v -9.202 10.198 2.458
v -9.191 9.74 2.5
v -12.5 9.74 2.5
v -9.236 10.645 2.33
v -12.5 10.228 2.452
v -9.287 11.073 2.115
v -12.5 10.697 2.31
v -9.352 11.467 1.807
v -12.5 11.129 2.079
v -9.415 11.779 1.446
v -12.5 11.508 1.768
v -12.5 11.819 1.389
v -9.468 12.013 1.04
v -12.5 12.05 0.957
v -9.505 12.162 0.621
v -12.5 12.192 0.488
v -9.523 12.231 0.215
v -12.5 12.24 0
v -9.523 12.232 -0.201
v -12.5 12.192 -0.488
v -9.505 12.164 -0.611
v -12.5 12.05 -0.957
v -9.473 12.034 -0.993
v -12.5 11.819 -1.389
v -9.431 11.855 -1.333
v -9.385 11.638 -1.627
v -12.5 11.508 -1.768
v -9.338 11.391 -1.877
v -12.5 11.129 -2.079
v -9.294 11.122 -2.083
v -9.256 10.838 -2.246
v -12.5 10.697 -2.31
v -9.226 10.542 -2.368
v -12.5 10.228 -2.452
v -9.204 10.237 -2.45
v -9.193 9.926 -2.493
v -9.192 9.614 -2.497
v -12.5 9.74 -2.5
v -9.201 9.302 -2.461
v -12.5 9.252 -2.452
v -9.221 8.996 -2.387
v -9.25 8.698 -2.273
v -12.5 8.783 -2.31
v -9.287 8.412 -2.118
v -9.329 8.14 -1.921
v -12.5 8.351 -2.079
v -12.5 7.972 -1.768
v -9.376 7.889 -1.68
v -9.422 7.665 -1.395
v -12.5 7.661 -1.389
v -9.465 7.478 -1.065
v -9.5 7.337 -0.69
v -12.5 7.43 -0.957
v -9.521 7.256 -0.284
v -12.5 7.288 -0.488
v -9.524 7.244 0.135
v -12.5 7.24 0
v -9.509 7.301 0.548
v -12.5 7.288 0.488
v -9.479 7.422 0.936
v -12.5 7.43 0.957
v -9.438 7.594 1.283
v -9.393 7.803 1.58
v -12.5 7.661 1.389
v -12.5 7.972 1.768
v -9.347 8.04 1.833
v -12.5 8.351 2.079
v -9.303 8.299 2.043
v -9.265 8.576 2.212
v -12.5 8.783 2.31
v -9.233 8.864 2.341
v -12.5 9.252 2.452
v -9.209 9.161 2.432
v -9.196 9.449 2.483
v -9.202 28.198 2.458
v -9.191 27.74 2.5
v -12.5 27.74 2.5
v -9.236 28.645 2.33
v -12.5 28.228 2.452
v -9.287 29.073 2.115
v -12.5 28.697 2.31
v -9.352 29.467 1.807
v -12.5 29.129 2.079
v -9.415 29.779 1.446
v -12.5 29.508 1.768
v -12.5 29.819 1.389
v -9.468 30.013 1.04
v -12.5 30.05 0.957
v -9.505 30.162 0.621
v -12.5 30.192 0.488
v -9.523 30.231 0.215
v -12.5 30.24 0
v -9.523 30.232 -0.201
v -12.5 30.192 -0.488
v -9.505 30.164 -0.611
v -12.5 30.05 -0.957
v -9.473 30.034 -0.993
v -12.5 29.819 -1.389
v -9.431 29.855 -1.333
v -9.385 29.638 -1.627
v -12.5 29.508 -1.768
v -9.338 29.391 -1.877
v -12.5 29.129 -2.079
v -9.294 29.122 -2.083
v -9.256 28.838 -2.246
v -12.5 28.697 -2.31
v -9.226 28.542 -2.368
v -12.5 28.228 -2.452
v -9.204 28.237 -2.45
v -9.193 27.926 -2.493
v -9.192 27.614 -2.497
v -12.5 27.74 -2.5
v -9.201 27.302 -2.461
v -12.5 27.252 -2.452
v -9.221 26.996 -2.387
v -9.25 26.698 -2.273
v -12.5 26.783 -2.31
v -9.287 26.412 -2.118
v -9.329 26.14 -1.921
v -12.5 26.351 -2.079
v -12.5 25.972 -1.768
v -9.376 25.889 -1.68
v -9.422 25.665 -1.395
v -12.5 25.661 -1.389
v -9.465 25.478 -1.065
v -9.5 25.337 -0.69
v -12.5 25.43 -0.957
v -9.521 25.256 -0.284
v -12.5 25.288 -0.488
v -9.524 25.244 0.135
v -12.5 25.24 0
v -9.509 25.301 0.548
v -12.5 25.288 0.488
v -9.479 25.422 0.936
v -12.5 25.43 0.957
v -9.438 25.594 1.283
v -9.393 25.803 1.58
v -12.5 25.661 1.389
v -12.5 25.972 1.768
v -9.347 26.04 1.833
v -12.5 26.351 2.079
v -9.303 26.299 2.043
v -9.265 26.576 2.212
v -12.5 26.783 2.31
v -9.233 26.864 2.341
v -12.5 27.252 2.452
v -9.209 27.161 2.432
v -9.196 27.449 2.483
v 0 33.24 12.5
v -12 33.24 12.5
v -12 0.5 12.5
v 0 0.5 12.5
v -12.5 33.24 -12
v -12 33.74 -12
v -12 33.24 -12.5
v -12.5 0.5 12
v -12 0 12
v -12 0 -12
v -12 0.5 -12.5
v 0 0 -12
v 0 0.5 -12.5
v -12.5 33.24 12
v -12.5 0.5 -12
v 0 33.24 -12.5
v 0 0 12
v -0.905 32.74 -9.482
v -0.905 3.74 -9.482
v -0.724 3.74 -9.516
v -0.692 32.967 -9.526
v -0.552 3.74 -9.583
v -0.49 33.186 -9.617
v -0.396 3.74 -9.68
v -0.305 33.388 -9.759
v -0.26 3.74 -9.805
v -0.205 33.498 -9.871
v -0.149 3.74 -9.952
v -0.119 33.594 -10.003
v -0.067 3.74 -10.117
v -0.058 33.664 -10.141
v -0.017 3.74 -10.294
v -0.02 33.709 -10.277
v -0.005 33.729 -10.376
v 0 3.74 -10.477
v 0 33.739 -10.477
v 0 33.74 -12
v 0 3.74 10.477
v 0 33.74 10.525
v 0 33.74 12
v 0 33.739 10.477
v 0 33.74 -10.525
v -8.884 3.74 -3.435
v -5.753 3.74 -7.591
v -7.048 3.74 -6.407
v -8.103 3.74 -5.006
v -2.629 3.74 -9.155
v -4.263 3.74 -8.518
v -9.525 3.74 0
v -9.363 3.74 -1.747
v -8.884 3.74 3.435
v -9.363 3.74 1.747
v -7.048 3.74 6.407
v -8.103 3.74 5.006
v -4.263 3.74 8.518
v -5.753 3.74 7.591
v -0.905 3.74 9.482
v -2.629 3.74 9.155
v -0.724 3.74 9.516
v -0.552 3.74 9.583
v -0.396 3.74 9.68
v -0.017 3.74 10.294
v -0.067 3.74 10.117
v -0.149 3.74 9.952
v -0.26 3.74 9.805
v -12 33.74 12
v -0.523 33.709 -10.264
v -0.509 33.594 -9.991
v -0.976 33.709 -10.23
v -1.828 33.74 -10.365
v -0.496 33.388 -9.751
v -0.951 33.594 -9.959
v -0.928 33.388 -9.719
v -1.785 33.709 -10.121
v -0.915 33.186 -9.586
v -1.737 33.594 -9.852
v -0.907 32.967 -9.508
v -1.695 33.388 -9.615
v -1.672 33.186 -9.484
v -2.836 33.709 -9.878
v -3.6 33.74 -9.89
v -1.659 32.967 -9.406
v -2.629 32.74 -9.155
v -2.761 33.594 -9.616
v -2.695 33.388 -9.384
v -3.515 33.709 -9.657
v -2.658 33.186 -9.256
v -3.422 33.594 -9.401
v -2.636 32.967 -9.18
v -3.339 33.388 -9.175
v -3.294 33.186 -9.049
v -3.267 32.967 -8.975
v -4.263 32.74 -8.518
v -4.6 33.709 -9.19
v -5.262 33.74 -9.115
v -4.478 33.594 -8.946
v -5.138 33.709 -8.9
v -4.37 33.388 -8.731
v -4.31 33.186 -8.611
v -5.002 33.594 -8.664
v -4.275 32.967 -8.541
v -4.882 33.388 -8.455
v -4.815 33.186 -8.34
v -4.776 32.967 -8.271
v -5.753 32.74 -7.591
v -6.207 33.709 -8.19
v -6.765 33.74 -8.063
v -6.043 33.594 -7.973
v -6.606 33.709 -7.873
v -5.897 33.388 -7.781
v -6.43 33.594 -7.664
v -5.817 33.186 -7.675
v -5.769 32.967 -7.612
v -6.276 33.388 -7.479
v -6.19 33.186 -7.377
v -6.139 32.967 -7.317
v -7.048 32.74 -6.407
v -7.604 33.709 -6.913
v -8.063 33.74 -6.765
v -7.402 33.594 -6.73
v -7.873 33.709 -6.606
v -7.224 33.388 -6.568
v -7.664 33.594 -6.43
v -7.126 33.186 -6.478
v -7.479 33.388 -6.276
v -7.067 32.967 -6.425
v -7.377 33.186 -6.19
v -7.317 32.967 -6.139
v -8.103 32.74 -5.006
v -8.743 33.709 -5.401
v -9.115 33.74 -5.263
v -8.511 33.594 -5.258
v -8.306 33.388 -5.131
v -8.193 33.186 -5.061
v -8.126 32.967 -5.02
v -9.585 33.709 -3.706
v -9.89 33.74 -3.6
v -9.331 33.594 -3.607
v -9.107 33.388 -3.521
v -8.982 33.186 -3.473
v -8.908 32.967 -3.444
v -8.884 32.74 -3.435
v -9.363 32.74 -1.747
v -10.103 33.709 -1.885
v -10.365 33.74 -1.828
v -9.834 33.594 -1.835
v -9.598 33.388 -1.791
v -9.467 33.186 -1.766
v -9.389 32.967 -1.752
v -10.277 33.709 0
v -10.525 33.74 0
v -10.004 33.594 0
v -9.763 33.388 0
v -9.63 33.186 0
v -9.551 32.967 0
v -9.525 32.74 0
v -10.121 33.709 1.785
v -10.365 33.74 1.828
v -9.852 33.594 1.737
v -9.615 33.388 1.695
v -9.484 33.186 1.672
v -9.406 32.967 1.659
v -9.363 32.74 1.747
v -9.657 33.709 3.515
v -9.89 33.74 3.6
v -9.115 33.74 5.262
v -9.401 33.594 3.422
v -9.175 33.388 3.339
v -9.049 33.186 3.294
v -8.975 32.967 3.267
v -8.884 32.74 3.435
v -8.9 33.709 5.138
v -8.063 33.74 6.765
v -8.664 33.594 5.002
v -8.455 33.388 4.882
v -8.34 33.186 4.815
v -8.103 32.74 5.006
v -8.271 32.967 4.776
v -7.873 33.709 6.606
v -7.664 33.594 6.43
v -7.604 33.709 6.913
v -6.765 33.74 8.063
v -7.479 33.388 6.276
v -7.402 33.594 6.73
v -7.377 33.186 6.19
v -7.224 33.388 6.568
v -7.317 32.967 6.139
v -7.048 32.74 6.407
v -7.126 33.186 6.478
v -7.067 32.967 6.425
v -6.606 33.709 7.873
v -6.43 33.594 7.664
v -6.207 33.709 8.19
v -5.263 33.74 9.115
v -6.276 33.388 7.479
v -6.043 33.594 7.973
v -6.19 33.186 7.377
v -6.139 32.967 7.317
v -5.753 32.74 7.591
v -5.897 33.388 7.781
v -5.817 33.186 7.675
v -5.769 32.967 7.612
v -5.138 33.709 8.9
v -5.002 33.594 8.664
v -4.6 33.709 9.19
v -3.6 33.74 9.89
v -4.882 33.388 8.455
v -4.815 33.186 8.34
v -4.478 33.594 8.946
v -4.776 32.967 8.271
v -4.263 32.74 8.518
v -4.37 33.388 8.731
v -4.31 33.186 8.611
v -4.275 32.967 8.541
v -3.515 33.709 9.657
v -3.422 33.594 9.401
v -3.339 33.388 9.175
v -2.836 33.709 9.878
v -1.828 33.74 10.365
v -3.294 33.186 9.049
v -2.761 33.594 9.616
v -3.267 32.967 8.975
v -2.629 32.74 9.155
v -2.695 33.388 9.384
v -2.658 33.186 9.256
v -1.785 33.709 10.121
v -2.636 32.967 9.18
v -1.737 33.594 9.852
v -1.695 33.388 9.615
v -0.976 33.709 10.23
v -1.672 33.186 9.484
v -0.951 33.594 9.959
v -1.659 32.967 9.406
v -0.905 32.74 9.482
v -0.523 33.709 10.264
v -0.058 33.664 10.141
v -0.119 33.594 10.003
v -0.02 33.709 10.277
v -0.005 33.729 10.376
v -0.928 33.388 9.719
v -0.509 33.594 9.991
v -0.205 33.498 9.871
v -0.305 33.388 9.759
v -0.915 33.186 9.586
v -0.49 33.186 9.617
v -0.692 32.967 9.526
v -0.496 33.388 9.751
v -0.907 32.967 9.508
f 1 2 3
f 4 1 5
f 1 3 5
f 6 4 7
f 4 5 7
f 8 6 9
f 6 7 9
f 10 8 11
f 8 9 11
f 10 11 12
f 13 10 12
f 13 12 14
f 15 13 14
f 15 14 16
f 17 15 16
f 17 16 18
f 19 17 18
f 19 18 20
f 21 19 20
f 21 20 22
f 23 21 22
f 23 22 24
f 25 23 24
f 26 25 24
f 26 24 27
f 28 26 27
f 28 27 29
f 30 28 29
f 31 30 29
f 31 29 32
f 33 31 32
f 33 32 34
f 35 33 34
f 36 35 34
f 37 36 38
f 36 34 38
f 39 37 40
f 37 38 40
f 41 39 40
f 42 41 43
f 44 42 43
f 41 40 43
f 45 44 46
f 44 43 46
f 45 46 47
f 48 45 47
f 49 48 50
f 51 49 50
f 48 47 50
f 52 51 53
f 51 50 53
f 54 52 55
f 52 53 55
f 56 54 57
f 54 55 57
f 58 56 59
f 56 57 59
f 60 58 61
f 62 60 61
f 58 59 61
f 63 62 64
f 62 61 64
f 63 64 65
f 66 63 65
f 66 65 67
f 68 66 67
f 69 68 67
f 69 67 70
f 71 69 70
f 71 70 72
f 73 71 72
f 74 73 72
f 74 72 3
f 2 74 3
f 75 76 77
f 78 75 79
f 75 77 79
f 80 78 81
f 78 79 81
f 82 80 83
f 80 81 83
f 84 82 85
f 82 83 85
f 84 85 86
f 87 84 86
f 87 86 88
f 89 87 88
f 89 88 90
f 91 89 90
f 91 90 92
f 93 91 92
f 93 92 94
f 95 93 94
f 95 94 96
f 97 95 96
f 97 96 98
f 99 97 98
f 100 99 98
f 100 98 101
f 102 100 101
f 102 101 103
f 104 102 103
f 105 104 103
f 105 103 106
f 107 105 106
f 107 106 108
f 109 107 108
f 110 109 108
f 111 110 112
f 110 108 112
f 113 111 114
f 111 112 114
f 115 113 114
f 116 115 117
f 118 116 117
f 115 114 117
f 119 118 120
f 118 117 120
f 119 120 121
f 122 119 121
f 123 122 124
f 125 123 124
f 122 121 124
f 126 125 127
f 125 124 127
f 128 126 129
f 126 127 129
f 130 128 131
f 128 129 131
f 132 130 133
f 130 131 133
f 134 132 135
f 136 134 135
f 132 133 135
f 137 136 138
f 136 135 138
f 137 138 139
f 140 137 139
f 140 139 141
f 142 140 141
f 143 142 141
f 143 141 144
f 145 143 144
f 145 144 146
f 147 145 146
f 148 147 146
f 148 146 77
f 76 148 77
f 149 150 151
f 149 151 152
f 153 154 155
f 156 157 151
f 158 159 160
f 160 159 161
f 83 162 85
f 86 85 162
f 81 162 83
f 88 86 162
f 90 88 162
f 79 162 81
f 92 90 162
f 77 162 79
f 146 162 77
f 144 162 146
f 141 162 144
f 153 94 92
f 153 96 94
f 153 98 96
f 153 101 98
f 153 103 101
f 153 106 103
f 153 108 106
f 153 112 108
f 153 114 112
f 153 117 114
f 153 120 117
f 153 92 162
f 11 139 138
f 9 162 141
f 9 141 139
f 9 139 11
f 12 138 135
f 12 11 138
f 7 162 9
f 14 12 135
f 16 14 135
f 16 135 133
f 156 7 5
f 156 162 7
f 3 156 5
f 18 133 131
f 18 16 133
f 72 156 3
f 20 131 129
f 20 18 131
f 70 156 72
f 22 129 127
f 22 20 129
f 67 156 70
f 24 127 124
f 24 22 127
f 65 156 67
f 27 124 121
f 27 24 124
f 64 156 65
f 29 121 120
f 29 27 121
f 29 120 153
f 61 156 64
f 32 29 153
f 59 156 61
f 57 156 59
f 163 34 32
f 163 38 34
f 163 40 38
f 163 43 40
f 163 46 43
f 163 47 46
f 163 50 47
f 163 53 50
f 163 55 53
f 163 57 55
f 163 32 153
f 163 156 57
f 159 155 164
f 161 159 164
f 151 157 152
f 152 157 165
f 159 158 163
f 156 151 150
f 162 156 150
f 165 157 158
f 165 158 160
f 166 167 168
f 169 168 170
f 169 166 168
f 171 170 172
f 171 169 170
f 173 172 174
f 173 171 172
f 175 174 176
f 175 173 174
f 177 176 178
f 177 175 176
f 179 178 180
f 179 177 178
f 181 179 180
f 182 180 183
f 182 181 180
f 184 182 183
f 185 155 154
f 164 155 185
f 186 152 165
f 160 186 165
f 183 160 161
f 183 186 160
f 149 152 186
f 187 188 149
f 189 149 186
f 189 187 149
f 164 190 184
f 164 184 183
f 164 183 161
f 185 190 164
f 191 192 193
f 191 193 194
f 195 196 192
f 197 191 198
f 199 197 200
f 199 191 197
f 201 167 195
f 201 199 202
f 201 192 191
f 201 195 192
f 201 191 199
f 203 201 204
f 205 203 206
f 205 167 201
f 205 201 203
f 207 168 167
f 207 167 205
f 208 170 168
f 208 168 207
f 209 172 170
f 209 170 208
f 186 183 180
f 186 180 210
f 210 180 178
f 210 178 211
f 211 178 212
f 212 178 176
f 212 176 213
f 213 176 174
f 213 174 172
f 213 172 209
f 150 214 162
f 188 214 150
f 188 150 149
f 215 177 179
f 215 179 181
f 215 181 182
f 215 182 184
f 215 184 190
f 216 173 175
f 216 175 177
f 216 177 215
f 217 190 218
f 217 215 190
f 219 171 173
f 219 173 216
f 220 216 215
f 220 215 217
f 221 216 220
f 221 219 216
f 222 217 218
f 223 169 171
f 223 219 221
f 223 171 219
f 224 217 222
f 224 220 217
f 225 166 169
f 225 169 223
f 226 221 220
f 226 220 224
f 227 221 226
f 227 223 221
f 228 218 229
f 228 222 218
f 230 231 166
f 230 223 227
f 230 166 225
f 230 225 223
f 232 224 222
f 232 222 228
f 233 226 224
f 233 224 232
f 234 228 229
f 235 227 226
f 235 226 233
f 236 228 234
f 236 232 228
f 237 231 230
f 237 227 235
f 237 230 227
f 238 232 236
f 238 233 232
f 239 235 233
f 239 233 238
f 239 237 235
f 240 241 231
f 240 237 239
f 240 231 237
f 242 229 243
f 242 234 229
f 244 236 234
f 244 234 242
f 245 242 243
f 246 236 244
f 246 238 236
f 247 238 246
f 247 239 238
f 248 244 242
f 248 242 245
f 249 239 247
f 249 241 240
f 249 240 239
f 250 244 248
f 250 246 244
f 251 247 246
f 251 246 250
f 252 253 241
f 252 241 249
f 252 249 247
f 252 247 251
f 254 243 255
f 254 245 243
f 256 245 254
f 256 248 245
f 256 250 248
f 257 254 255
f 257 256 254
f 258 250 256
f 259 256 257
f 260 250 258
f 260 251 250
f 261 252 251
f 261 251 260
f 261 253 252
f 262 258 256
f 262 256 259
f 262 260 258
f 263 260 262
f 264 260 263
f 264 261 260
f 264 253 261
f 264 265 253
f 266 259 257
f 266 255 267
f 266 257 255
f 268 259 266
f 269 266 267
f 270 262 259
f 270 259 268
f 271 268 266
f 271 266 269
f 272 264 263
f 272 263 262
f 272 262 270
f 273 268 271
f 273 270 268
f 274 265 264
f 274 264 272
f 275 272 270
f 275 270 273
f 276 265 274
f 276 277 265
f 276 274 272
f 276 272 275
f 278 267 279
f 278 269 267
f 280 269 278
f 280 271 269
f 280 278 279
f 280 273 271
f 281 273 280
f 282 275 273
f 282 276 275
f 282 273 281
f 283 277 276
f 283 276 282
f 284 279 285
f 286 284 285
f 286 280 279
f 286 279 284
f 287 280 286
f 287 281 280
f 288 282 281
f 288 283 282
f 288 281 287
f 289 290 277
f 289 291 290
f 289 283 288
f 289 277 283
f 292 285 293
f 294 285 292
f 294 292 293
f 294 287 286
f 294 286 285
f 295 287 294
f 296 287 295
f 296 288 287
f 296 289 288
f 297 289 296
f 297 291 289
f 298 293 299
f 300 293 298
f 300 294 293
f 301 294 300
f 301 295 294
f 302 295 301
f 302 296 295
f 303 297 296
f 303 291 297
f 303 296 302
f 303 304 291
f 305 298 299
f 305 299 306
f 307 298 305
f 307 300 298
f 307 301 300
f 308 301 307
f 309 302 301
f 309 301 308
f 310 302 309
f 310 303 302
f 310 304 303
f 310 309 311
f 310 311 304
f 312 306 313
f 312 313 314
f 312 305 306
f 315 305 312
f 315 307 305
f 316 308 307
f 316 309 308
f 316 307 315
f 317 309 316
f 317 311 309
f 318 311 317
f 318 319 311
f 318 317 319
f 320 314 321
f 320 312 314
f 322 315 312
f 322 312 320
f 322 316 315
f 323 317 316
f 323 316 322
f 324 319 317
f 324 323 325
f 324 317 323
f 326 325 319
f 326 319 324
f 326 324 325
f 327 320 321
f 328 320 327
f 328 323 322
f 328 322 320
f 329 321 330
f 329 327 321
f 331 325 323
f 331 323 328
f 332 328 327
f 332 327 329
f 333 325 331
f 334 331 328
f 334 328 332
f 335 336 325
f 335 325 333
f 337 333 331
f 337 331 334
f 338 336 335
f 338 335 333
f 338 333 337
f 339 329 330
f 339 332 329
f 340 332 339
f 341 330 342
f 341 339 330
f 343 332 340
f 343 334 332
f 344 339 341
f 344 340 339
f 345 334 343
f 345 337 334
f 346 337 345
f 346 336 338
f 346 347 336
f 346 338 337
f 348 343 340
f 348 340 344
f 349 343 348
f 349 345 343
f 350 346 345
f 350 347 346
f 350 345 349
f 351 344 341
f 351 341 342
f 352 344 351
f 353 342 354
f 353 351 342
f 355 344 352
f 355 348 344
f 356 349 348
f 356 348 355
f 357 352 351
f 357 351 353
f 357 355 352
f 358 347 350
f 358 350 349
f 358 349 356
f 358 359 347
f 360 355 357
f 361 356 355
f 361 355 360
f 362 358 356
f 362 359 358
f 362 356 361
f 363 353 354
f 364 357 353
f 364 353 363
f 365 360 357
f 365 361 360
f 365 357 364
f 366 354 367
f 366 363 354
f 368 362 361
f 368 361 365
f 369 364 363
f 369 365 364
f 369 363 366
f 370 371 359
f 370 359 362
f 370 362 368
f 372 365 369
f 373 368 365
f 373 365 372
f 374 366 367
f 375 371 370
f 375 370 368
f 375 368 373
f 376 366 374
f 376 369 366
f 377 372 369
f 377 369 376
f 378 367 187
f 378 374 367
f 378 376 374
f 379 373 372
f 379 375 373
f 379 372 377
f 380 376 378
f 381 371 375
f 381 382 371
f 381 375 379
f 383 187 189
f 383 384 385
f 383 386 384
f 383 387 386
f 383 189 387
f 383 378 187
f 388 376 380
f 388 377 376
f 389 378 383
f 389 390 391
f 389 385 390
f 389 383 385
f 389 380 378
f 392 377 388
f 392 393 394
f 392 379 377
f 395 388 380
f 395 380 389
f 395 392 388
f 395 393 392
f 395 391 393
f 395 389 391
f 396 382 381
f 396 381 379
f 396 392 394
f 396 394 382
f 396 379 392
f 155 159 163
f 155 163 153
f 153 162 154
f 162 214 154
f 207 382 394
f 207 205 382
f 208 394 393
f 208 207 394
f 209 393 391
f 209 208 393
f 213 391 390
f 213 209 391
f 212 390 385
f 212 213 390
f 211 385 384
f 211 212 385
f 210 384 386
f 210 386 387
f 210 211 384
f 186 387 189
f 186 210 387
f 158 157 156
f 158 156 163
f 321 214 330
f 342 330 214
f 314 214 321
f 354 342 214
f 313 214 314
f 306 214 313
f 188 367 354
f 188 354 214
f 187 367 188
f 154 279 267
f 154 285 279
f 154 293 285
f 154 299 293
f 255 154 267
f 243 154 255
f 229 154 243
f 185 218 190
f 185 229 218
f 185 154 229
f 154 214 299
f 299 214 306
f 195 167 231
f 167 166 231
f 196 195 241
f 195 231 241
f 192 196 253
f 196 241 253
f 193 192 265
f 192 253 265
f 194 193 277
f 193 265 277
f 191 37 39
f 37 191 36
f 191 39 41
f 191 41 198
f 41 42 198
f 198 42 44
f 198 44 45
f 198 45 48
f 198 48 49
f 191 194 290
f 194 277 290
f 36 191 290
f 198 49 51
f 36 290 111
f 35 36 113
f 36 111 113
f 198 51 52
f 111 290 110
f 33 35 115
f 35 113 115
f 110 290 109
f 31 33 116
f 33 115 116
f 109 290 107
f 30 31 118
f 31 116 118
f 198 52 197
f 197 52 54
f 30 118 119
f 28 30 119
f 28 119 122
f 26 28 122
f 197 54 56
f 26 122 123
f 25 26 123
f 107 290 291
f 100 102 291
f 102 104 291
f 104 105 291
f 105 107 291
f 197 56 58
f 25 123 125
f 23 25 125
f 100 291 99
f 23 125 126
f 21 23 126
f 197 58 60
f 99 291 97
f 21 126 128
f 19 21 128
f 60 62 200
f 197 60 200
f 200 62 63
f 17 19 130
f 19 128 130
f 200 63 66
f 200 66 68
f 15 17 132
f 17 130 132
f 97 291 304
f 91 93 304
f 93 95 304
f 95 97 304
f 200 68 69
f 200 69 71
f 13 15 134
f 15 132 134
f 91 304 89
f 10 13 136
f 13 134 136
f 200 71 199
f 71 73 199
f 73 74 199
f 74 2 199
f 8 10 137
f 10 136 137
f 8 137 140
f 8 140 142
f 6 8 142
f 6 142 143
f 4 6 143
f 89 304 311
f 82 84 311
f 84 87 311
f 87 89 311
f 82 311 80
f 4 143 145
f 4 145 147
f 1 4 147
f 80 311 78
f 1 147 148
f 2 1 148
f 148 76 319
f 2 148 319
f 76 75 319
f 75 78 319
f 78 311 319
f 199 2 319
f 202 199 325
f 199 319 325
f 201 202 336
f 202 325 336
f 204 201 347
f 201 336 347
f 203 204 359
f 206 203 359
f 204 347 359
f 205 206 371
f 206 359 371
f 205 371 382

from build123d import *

# Parameters (mm, degrees)
SKETCH1_W           = 25
SKETCH1_H           = 25
BOSS_EXTRUDE1_DEPTH = 33.74
SKETCH2_R           = 9.525
CUT_EXTRUDE1_DEPTH  = 30
SKETCH3_W           = 12.5
SKETCH3_H           = 25
CUT_EXTRUDE2_DEPTH  = 39.090518505
SKETCH4_R           = 2.5
CUT_EXTRUDE3_DEPTH  = 39.090518505
CHAMFER2_SIZE       = 0.5
FILLET1_R           = 1


with BuildPart() as part:
    # Sketch1 → Boss-Extrude1 (new body)
    with BuildSketch(Plane(origin=(0, 0, 0), x_dir=(1, 0, 0), z_dir=(0, 1, 0))):
        Rectangle(SKETCH1_W, SKETCH1_H)
    extrude(amount=BOSS_EXTRUDE1_DEPTH)

    # Sketch2 → Cut-Extrude1 (cut)
    with BuildSketch(Plane(origin=(0, 33.74, 0), x_dir=(1, 0, 0), z_dir=(0, 1, 0))):
        with Locations(Location((0, 0, 0), (0, 0, 270))):
            Circle(SKETCH2_R)
    extrude(amount=-CUT_EXTRUDE1_DEPTH, mode=Mode.SUBTRACT)

    # Sketch3 → Cut-Extrude2 (cut, through all)
    with BuildSketch(Plane(origin=(0, 33.74, 0), x_dir=(1, 0, 0), z_dir=(0, 1, 0))):
        with Locations((6.25, 0)):
            Rectangle(SKETCH3_W, SKETCH3_H)
    extrude(amount=-CUT_EXTRUDE2_DEPTH, mode=Mode.SUBTRACT)

    # Sketch4 → Cut-Extrude3 (cut, through all)
    with BuildSketch(Plane.ZY.offset(12.5)):
        with Locations((0, 27.74)):
            Circle(SKETCH4_R)
        with Locations((0, 9.74)):
            Circle(SKETCH4_R)
    extrude(amount=-CUT_EXTRUDE3_DEPTH, mode=Mode.SUBTRACT)

    # Chamfer2
    chamfer2_edges = [part.edges().sort_by_distance(p)[0] for p in [
        (-12.5, 33.74, 0),
        (-6.25, 33.74, 12.5),
        (-6.25, 0, -12.5),
        (-6.25, 33.74, -12.5),
        (-6.25, 0, 12.5),
        (-12.5, 0, 0),
        (-12.5, 16.87, 12.5),
        (-12.5, 16.87, -12.5),
    ]]
    chamfer(chamfer2_edges, length=CHAMFER2_SIZE)

    # Fillet1
    fillet1_edges = [part.edges().sort_by_distance(p)[0] for p in [
        (-9.525, 33.74, 0),
        (0, 18.74, 9.525),
        (0, 18.74, -9.525),
    ]]
    fillet(fillet1_edges, radius=FILLET1_R)


solid = part.part
